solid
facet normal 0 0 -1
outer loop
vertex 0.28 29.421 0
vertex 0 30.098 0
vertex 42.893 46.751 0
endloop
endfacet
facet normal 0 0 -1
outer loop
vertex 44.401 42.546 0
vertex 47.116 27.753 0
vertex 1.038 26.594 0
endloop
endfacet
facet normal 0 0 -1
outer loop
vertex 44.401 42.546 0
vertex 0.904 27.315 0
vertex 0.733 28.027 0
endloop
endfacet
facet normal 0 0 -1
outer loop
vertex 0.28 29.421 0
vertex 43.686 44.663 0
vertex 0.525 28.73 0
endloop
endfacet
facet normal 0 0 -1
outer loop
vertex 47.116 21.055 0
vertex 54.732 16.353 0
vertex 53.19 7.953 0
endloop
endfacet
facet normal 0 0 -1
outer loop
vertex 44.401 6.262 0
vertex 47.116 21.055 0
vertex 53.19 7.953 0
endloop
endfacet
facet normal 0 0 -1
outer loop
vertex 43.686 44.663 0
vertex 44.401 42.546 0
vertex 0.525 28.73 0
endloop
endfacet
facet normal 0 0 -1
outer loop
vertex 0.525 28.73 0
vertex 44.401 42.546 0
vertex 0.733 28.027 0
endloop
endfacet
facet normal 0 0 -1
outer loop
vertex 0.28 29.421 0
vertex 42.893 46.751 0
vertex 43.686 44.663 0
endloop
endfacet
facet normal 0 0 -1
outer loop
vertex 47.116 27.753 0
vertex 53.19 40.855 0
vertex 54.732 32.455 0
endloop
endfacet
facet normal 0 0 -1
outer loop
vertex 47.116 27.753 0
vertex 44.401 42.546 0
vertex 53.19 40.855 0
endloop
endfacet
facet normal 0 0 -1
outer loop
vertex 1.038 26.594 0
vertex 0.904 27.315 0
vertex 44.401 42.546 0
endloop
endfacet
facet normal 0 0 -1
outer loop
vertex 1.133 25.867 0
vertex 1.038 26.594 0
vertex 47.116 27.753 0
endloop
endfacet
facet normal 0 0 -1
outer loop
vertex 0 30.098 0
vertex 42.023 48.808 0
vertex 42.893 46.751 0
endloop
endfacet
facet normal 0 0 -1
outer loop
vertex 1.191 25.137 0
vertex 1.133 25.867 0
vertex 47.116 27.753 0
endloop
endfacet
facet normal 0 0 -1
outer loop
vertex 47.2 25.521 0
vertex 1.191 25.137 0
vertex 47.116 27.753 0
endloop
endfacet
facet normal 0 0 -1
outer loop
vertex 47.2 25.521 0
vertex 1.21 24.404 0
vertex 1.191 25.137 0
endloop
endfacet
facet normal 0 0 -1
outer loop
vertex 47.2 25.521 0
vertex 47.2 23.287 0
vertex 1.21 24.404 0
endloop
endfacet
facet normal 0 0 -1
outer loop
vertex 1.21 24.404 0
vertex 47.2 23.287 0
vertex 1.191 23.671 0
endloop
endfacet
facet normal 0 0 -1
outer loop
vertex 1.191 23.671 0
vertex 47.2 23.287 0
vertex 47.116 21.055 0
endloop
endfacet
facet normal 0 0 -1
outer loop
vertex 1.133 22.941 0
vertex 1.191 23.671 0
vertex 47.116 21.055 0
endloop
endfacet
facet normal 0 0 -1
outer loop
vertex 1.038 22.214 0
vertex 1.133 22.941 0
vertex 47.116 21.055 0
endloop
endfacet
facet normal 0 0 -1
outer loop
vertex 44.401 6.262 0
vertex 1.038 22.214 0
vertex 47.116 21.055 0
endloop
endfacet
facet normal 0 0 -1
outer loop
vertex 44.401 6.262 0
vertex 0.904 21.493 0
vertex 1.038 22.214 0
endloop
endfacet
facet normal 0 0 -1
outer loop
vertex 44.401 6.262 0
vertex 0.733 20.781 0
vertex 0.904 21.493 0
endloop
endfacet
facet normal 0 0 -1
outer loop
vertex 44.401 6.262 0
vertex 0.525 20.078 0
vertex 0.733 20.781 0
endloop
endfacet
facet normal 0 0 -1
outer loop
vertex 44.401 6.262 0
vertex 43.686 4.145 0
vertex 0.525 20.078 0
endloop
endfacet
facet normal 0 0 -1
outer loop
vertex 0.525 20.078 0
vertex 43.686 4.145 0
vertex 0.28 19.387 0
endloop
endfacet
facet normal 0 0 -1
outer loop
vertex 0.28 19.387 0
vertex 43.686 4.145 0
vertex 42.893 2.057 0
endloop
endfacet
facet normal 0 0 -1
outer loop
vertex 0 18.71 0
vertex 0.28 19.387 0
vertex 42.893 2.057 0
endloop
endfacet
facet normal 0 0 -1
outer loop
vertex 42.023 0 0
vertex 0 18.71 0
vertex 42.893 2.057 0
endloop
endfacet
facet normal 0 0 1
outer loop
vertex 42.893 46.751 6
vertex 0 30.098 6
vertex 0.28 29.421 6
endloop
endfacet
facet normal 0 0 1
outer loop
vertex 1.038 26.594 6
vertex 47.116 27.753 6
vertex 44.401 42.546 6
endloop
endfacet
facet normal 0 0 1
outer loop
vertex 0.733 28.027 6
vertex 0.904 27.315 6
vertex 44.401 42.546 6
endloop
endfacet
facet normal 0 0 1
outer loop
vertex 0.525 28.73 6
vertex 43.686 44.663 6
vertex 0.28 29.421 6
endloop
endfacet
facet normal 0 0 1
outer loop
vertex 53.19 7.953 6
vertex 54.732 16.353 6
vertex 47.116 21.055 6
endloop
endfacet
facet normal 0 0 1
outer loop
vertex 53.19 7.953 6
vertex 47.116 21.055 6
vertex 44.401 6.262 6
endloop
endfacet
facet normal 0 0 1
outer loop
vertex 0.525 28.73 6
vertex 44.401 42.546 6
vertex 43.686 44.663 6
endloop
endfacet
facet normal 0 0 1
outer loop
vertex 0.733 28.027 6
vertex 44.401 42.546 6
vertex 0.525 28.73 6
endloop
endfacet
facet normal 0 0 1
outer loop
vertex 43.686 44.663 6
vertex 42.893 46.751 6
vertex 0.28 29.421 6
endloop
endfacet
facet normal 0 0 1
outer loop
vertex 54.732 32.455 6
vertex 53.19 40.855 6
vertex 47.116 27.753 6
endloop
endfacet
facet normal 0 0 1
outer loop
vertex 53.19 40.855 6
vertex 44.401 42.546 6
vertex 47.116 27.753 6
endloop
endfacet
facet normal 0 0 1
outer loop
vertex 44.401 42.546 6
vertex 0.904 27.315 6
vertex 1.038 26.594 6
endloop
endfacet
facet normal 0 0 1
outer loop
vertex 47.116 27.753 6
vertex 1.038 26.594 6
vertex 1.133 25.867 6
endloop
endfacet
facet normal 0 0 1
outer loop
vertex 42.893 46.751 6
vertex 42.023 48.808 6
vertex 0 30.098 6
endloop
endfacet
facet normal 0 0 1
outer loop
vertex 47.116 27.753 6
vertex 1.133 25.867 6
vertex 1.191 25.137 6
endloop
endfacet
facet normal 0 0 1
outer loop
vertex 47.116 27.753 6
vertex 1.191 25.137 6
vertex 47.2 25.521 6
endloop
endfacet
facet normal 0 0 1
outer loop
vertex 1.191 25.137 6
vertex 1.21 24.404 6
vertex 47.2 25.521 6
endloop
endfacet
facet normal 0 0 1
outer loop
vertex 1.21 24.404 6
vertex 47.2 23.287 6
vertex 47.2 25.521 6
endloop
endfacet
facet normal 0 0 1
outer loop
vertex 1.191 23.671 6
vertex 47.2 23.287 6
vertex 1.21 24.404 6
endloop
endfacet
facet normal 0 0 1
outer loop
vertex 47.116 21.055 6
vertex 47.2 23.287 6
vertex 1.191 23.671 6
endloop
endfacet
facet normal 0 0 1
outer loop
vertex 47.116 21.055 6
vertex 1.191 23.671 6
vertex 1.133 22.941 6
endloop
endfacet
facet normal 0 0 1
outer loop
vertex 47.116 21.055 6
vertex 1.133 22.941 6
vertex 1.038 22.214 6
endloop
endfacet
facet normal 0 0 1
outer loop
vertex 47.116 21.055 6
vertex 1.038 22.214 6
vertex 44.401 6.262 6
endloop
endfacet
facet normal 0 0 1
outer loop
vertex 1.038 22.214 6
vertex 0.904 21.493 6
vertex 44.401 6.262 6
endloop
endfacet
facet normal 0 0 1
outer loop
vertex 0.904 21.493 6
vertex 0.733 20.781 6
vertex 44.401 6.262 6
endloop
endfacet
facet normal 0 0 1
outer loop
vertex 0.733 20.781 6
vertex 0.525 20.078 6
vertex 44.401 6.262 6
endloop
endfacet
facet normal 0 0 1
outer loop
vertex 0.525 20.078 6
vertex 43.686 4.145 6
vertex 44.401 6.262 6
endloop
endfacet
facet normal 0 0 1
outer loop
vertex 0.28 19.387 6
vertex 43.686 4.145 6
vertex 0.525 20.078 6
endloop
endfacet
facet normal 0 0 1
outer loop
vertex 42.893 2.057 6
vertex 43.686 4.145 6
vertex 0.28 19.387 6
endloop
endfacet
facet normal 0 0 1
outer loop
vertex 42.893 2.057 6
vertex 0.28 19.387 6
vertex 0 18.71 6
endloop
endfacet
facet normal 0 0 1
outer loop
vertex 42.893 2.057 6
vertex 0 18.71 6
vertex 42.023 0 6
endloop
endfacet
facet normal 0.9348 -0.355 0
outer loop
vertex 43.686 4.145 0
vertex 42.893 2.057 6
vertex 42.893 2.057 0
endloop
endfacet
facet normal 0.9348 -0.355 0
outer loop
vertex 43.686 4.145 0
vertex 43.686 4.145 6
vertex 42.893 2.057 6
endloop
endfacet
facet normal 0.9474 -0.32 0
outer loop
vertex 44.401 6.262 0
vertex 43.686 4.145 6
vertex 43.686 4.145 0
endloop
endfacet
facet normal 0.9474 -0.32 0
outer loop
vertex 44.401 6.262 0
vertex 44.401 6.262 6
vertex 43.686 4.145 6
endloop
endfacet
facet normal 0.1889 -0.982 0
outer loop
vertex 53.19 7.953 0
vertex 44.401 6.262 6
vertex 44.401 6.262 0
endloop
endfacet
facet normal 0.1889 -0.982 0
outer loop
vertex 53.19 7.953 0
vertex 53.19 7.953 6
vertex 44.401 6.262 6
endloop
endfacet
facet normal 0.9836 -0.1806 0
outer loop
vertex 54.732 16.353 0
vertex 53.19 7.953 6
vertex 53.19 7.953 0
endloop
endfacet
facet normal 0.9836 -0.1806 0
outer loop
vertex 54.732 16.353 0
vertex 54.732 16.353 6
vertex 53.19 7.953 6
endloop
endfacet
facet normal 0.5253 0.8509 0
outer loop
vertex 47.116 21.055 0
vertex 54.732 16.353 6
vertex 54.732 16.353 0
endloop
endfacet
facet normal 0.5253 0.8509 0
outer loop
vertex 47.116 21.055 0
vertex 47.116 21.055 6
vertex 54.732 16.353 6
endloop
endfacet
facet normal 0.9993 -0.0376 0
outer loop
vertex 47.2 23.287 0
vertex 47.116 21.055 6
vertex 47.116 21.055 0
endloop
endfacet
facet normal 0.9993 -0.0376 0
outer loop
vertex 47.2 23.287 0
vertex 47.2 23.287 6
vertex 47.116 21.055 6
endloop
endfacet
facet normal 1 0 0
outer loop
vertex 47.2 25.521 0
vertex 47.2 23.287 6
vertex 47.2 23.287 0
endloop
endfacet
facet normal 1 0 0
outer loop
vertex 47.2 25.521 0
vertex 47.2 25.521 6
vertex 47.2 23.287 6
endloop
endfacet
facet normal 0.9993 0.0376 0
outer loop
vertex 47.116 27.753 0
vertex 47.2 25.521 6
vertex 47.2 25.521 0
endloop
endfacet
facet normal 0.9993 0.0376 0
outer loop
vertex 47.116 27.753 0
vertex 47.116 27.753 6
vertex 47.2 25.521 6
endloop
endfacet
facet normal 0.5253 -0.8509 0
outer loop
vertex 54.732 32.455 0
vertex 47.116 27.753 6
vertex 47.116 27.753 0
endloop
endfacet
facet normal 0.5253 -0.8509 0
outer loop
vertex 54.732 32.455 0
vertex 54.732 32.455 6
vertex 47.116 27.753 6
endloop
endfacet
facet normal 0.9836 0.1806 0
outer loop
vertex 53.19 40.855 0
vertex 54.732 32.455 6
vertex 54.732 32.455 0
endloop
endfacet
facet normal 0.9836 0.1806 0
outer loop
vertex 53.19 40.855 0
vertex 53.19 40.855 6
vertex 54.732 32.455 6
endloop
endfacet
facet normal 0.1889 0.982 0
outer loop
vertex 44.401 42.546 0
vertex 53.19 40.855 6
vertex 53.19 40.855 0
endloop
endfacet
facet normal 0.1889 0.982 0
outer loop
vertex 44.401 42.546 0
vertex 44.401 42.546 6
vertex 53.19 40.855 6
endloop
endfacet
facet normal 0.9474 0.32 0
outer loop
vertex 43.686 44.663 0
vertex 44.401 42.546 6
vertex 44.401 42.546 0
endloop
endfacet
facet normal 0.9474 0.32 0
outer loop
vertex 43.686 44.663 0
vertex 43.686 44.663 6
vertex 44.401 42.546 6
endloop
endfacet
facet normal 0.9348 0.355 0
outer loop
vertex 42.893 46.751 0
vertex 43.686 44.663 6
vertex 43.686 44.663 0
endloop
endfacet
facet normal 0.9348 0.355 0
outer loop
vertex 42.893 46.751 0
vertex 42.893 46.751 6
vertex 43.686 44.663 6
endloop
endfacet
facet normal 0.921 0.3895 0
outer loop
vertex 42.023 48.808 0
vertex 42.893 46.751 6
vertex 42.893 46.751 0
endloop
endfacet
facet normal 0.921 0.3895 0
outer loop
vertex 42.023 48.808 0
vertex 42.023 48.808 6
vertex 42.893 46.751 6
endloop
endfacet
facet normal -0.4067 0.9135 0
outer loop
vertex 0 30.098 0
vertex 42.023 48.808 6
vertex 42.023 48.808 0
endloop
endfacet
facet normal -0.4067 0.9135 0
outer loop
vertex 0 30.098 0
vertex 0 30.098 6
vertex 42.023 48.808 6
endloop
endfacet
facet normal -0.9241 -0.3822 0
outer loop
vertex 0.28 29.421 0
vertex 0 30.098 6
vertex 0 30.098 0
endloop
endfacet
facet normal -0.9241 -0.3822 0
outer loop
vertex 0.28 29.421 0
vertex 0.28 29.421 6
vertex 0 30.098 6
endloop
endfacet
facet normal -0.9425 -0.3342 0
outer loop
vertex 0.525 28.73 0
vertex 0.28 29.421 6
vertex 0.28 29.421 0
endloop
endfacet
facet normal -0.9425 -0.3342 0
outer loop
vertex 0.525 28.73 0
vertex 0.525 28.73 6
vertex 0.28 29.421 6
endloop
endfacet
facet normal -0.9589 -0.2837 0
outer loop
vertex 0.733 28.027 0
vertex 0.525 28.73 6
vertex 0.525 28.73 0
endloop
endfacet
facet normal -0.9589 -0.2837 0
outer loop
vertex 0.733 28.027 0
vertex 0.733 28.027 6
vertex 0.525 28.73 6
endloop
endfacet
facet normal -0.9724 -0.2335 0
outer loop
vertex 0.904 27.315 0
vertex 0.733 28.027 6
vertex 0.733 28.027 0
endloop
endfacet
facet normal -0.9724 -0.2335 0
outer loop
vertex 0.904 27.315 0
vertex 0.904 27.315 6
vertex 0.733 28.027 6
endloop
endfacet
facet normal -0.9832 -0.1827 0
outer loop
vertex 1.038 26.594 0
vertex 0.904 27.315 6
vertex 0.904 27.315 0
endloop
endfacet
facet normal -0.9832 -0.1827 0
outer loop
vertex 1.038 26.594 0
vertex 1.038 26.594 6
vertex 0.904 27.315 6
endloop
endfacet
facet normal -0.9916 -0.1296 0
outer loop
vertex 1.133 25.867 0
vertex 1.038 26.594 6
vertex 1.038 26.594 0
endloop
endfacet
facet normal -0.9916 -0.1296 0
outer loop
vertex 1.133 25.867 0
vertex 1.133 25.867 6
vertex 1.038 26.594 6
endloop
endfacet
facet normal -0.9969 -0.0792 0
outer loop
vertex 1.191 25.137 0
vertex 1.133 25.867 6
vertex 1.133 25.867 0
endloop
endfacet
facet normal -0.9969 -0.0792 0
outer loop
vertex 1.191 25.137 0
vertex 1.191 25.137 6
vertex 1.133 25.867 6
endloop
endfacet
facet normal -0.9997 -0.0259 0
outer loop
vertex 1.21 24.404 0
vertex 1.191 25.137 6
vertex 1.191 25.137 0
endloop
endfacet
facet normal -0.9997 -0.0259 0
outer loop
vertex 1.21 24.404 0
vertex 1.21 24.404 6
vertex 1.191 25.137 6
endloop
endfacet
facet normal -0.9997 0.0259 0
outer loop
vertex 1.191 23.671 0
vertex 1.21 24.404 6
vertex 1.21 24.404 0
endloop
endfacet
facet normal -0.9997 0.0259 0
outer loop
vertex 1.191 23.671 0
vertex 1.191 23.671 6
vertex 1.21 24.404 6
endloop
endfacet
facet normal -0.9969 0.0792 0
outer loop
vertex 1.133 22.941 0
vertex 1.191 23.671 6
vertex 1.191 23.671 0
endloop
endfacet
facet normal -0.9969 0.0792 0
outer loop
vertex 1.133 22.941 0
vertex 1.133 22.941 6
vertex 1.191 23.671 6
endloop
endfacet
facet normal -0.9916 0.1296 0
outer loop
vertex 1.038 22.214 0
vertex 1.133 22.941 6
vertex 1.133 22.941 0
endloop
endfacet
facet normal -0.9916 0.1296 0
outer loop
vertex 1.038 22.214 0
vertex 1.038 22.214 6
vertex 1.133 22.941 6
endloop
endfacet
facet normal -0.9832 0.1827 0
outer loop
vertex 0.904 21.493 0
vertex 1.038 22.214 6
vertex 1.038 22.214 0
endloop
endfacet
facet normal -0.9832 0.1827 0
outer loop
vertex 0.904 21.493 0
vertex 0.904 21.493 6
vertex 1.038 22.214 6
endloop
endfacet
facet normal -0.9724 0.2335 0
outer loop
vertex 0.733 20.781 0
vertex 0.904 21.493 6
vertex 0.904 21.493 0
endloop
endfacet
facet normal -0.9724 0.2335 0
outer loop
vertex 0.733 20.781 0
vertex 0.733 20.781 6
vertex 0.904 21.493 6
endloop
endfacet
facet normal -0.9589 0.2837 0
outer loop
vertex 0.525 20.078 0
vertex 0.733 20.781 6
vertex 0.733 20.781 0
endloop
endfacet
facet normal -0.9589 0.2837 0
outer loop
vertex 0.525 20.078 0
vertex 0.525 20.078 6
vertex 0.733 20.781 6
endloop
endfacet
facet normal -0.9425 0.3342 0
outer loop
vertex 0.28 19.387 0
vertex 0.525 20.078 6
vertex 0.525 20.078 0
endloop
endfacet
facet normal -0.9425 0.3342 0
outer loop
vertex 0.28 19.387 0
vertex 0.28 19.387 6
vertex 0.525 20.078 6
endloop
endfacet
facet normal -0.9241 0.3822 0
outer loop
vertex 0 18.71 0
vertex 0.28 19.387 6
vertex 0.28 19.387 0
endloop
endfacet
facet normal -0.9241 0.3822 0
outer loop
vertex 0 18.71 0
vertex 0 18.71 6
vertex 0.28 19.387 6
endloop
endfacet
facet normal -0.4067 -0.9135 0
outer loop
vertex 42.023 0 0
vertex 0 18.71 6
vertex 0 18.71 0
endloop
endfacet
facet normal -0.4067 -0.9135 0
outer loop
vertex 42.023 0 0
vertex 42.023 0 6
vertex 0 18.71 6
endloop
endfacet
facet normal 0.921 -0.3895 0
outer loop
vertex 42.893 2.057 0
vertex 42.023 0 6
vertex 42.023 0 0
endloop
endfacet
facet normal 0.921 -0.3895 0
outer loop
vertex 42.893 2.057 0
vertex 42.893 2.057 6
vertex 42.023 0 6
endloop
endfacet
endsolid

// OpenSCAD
$fn = 32;

// ----------------------------------------------------------------------
// Gear sector: 2 teeth on 48 degrees
// ----------------------------------------------------------------------

// --- parameters (mm) ---
sector_angle = 48;        // sector angle, degrees
root_r = 60;              // root circle radius
tooth_h = 8;              // tooth height over the root circle
teeth = 2;                // number of teeth on the sector
hub_r = 14;               // hub bore radius
plate_t = 6;              // sector thickness, Z
arc_step = 3;             // sampling step of the root/hub arcs, degrees

tip_r = root_r + tooth_h;  // tip circle radius

profile = [[42.023, 0], [42.893, 2.057], [43.686, 4.145], [44.401, 6.262], [53.19, 7.953], [54.732, 16.353], [47.116, 21.055], [47.2, 23.287], [47.2, 25.521], [47.116, 27.753], [54.732, 32.455], [53.19, 40.855], [44.401, 42.546], [43.686, 44.663], [42.893, 46.751], [42.023, 48.808], [0, 30.098], [0.28, 29.421], [0.525, 28.73], [0.733, 28.027], [0.904, 27.315], [1.038, 26.594], [1.133, 25.867], [1.191, 25.137], [1.21, 24.404], [1.191, 23.671], [1.133, 22.941], [1.038, 22.214], [0.904, 21.493], [0.733, 20.781], [0.525, 20.078], [0.28, 19.387], [0, 18.71]];  // primary outline, 33 points, counter clockwise

// --- the one profile operation ---
linear_extrude(height = plate_t) polygon(points = profile);
